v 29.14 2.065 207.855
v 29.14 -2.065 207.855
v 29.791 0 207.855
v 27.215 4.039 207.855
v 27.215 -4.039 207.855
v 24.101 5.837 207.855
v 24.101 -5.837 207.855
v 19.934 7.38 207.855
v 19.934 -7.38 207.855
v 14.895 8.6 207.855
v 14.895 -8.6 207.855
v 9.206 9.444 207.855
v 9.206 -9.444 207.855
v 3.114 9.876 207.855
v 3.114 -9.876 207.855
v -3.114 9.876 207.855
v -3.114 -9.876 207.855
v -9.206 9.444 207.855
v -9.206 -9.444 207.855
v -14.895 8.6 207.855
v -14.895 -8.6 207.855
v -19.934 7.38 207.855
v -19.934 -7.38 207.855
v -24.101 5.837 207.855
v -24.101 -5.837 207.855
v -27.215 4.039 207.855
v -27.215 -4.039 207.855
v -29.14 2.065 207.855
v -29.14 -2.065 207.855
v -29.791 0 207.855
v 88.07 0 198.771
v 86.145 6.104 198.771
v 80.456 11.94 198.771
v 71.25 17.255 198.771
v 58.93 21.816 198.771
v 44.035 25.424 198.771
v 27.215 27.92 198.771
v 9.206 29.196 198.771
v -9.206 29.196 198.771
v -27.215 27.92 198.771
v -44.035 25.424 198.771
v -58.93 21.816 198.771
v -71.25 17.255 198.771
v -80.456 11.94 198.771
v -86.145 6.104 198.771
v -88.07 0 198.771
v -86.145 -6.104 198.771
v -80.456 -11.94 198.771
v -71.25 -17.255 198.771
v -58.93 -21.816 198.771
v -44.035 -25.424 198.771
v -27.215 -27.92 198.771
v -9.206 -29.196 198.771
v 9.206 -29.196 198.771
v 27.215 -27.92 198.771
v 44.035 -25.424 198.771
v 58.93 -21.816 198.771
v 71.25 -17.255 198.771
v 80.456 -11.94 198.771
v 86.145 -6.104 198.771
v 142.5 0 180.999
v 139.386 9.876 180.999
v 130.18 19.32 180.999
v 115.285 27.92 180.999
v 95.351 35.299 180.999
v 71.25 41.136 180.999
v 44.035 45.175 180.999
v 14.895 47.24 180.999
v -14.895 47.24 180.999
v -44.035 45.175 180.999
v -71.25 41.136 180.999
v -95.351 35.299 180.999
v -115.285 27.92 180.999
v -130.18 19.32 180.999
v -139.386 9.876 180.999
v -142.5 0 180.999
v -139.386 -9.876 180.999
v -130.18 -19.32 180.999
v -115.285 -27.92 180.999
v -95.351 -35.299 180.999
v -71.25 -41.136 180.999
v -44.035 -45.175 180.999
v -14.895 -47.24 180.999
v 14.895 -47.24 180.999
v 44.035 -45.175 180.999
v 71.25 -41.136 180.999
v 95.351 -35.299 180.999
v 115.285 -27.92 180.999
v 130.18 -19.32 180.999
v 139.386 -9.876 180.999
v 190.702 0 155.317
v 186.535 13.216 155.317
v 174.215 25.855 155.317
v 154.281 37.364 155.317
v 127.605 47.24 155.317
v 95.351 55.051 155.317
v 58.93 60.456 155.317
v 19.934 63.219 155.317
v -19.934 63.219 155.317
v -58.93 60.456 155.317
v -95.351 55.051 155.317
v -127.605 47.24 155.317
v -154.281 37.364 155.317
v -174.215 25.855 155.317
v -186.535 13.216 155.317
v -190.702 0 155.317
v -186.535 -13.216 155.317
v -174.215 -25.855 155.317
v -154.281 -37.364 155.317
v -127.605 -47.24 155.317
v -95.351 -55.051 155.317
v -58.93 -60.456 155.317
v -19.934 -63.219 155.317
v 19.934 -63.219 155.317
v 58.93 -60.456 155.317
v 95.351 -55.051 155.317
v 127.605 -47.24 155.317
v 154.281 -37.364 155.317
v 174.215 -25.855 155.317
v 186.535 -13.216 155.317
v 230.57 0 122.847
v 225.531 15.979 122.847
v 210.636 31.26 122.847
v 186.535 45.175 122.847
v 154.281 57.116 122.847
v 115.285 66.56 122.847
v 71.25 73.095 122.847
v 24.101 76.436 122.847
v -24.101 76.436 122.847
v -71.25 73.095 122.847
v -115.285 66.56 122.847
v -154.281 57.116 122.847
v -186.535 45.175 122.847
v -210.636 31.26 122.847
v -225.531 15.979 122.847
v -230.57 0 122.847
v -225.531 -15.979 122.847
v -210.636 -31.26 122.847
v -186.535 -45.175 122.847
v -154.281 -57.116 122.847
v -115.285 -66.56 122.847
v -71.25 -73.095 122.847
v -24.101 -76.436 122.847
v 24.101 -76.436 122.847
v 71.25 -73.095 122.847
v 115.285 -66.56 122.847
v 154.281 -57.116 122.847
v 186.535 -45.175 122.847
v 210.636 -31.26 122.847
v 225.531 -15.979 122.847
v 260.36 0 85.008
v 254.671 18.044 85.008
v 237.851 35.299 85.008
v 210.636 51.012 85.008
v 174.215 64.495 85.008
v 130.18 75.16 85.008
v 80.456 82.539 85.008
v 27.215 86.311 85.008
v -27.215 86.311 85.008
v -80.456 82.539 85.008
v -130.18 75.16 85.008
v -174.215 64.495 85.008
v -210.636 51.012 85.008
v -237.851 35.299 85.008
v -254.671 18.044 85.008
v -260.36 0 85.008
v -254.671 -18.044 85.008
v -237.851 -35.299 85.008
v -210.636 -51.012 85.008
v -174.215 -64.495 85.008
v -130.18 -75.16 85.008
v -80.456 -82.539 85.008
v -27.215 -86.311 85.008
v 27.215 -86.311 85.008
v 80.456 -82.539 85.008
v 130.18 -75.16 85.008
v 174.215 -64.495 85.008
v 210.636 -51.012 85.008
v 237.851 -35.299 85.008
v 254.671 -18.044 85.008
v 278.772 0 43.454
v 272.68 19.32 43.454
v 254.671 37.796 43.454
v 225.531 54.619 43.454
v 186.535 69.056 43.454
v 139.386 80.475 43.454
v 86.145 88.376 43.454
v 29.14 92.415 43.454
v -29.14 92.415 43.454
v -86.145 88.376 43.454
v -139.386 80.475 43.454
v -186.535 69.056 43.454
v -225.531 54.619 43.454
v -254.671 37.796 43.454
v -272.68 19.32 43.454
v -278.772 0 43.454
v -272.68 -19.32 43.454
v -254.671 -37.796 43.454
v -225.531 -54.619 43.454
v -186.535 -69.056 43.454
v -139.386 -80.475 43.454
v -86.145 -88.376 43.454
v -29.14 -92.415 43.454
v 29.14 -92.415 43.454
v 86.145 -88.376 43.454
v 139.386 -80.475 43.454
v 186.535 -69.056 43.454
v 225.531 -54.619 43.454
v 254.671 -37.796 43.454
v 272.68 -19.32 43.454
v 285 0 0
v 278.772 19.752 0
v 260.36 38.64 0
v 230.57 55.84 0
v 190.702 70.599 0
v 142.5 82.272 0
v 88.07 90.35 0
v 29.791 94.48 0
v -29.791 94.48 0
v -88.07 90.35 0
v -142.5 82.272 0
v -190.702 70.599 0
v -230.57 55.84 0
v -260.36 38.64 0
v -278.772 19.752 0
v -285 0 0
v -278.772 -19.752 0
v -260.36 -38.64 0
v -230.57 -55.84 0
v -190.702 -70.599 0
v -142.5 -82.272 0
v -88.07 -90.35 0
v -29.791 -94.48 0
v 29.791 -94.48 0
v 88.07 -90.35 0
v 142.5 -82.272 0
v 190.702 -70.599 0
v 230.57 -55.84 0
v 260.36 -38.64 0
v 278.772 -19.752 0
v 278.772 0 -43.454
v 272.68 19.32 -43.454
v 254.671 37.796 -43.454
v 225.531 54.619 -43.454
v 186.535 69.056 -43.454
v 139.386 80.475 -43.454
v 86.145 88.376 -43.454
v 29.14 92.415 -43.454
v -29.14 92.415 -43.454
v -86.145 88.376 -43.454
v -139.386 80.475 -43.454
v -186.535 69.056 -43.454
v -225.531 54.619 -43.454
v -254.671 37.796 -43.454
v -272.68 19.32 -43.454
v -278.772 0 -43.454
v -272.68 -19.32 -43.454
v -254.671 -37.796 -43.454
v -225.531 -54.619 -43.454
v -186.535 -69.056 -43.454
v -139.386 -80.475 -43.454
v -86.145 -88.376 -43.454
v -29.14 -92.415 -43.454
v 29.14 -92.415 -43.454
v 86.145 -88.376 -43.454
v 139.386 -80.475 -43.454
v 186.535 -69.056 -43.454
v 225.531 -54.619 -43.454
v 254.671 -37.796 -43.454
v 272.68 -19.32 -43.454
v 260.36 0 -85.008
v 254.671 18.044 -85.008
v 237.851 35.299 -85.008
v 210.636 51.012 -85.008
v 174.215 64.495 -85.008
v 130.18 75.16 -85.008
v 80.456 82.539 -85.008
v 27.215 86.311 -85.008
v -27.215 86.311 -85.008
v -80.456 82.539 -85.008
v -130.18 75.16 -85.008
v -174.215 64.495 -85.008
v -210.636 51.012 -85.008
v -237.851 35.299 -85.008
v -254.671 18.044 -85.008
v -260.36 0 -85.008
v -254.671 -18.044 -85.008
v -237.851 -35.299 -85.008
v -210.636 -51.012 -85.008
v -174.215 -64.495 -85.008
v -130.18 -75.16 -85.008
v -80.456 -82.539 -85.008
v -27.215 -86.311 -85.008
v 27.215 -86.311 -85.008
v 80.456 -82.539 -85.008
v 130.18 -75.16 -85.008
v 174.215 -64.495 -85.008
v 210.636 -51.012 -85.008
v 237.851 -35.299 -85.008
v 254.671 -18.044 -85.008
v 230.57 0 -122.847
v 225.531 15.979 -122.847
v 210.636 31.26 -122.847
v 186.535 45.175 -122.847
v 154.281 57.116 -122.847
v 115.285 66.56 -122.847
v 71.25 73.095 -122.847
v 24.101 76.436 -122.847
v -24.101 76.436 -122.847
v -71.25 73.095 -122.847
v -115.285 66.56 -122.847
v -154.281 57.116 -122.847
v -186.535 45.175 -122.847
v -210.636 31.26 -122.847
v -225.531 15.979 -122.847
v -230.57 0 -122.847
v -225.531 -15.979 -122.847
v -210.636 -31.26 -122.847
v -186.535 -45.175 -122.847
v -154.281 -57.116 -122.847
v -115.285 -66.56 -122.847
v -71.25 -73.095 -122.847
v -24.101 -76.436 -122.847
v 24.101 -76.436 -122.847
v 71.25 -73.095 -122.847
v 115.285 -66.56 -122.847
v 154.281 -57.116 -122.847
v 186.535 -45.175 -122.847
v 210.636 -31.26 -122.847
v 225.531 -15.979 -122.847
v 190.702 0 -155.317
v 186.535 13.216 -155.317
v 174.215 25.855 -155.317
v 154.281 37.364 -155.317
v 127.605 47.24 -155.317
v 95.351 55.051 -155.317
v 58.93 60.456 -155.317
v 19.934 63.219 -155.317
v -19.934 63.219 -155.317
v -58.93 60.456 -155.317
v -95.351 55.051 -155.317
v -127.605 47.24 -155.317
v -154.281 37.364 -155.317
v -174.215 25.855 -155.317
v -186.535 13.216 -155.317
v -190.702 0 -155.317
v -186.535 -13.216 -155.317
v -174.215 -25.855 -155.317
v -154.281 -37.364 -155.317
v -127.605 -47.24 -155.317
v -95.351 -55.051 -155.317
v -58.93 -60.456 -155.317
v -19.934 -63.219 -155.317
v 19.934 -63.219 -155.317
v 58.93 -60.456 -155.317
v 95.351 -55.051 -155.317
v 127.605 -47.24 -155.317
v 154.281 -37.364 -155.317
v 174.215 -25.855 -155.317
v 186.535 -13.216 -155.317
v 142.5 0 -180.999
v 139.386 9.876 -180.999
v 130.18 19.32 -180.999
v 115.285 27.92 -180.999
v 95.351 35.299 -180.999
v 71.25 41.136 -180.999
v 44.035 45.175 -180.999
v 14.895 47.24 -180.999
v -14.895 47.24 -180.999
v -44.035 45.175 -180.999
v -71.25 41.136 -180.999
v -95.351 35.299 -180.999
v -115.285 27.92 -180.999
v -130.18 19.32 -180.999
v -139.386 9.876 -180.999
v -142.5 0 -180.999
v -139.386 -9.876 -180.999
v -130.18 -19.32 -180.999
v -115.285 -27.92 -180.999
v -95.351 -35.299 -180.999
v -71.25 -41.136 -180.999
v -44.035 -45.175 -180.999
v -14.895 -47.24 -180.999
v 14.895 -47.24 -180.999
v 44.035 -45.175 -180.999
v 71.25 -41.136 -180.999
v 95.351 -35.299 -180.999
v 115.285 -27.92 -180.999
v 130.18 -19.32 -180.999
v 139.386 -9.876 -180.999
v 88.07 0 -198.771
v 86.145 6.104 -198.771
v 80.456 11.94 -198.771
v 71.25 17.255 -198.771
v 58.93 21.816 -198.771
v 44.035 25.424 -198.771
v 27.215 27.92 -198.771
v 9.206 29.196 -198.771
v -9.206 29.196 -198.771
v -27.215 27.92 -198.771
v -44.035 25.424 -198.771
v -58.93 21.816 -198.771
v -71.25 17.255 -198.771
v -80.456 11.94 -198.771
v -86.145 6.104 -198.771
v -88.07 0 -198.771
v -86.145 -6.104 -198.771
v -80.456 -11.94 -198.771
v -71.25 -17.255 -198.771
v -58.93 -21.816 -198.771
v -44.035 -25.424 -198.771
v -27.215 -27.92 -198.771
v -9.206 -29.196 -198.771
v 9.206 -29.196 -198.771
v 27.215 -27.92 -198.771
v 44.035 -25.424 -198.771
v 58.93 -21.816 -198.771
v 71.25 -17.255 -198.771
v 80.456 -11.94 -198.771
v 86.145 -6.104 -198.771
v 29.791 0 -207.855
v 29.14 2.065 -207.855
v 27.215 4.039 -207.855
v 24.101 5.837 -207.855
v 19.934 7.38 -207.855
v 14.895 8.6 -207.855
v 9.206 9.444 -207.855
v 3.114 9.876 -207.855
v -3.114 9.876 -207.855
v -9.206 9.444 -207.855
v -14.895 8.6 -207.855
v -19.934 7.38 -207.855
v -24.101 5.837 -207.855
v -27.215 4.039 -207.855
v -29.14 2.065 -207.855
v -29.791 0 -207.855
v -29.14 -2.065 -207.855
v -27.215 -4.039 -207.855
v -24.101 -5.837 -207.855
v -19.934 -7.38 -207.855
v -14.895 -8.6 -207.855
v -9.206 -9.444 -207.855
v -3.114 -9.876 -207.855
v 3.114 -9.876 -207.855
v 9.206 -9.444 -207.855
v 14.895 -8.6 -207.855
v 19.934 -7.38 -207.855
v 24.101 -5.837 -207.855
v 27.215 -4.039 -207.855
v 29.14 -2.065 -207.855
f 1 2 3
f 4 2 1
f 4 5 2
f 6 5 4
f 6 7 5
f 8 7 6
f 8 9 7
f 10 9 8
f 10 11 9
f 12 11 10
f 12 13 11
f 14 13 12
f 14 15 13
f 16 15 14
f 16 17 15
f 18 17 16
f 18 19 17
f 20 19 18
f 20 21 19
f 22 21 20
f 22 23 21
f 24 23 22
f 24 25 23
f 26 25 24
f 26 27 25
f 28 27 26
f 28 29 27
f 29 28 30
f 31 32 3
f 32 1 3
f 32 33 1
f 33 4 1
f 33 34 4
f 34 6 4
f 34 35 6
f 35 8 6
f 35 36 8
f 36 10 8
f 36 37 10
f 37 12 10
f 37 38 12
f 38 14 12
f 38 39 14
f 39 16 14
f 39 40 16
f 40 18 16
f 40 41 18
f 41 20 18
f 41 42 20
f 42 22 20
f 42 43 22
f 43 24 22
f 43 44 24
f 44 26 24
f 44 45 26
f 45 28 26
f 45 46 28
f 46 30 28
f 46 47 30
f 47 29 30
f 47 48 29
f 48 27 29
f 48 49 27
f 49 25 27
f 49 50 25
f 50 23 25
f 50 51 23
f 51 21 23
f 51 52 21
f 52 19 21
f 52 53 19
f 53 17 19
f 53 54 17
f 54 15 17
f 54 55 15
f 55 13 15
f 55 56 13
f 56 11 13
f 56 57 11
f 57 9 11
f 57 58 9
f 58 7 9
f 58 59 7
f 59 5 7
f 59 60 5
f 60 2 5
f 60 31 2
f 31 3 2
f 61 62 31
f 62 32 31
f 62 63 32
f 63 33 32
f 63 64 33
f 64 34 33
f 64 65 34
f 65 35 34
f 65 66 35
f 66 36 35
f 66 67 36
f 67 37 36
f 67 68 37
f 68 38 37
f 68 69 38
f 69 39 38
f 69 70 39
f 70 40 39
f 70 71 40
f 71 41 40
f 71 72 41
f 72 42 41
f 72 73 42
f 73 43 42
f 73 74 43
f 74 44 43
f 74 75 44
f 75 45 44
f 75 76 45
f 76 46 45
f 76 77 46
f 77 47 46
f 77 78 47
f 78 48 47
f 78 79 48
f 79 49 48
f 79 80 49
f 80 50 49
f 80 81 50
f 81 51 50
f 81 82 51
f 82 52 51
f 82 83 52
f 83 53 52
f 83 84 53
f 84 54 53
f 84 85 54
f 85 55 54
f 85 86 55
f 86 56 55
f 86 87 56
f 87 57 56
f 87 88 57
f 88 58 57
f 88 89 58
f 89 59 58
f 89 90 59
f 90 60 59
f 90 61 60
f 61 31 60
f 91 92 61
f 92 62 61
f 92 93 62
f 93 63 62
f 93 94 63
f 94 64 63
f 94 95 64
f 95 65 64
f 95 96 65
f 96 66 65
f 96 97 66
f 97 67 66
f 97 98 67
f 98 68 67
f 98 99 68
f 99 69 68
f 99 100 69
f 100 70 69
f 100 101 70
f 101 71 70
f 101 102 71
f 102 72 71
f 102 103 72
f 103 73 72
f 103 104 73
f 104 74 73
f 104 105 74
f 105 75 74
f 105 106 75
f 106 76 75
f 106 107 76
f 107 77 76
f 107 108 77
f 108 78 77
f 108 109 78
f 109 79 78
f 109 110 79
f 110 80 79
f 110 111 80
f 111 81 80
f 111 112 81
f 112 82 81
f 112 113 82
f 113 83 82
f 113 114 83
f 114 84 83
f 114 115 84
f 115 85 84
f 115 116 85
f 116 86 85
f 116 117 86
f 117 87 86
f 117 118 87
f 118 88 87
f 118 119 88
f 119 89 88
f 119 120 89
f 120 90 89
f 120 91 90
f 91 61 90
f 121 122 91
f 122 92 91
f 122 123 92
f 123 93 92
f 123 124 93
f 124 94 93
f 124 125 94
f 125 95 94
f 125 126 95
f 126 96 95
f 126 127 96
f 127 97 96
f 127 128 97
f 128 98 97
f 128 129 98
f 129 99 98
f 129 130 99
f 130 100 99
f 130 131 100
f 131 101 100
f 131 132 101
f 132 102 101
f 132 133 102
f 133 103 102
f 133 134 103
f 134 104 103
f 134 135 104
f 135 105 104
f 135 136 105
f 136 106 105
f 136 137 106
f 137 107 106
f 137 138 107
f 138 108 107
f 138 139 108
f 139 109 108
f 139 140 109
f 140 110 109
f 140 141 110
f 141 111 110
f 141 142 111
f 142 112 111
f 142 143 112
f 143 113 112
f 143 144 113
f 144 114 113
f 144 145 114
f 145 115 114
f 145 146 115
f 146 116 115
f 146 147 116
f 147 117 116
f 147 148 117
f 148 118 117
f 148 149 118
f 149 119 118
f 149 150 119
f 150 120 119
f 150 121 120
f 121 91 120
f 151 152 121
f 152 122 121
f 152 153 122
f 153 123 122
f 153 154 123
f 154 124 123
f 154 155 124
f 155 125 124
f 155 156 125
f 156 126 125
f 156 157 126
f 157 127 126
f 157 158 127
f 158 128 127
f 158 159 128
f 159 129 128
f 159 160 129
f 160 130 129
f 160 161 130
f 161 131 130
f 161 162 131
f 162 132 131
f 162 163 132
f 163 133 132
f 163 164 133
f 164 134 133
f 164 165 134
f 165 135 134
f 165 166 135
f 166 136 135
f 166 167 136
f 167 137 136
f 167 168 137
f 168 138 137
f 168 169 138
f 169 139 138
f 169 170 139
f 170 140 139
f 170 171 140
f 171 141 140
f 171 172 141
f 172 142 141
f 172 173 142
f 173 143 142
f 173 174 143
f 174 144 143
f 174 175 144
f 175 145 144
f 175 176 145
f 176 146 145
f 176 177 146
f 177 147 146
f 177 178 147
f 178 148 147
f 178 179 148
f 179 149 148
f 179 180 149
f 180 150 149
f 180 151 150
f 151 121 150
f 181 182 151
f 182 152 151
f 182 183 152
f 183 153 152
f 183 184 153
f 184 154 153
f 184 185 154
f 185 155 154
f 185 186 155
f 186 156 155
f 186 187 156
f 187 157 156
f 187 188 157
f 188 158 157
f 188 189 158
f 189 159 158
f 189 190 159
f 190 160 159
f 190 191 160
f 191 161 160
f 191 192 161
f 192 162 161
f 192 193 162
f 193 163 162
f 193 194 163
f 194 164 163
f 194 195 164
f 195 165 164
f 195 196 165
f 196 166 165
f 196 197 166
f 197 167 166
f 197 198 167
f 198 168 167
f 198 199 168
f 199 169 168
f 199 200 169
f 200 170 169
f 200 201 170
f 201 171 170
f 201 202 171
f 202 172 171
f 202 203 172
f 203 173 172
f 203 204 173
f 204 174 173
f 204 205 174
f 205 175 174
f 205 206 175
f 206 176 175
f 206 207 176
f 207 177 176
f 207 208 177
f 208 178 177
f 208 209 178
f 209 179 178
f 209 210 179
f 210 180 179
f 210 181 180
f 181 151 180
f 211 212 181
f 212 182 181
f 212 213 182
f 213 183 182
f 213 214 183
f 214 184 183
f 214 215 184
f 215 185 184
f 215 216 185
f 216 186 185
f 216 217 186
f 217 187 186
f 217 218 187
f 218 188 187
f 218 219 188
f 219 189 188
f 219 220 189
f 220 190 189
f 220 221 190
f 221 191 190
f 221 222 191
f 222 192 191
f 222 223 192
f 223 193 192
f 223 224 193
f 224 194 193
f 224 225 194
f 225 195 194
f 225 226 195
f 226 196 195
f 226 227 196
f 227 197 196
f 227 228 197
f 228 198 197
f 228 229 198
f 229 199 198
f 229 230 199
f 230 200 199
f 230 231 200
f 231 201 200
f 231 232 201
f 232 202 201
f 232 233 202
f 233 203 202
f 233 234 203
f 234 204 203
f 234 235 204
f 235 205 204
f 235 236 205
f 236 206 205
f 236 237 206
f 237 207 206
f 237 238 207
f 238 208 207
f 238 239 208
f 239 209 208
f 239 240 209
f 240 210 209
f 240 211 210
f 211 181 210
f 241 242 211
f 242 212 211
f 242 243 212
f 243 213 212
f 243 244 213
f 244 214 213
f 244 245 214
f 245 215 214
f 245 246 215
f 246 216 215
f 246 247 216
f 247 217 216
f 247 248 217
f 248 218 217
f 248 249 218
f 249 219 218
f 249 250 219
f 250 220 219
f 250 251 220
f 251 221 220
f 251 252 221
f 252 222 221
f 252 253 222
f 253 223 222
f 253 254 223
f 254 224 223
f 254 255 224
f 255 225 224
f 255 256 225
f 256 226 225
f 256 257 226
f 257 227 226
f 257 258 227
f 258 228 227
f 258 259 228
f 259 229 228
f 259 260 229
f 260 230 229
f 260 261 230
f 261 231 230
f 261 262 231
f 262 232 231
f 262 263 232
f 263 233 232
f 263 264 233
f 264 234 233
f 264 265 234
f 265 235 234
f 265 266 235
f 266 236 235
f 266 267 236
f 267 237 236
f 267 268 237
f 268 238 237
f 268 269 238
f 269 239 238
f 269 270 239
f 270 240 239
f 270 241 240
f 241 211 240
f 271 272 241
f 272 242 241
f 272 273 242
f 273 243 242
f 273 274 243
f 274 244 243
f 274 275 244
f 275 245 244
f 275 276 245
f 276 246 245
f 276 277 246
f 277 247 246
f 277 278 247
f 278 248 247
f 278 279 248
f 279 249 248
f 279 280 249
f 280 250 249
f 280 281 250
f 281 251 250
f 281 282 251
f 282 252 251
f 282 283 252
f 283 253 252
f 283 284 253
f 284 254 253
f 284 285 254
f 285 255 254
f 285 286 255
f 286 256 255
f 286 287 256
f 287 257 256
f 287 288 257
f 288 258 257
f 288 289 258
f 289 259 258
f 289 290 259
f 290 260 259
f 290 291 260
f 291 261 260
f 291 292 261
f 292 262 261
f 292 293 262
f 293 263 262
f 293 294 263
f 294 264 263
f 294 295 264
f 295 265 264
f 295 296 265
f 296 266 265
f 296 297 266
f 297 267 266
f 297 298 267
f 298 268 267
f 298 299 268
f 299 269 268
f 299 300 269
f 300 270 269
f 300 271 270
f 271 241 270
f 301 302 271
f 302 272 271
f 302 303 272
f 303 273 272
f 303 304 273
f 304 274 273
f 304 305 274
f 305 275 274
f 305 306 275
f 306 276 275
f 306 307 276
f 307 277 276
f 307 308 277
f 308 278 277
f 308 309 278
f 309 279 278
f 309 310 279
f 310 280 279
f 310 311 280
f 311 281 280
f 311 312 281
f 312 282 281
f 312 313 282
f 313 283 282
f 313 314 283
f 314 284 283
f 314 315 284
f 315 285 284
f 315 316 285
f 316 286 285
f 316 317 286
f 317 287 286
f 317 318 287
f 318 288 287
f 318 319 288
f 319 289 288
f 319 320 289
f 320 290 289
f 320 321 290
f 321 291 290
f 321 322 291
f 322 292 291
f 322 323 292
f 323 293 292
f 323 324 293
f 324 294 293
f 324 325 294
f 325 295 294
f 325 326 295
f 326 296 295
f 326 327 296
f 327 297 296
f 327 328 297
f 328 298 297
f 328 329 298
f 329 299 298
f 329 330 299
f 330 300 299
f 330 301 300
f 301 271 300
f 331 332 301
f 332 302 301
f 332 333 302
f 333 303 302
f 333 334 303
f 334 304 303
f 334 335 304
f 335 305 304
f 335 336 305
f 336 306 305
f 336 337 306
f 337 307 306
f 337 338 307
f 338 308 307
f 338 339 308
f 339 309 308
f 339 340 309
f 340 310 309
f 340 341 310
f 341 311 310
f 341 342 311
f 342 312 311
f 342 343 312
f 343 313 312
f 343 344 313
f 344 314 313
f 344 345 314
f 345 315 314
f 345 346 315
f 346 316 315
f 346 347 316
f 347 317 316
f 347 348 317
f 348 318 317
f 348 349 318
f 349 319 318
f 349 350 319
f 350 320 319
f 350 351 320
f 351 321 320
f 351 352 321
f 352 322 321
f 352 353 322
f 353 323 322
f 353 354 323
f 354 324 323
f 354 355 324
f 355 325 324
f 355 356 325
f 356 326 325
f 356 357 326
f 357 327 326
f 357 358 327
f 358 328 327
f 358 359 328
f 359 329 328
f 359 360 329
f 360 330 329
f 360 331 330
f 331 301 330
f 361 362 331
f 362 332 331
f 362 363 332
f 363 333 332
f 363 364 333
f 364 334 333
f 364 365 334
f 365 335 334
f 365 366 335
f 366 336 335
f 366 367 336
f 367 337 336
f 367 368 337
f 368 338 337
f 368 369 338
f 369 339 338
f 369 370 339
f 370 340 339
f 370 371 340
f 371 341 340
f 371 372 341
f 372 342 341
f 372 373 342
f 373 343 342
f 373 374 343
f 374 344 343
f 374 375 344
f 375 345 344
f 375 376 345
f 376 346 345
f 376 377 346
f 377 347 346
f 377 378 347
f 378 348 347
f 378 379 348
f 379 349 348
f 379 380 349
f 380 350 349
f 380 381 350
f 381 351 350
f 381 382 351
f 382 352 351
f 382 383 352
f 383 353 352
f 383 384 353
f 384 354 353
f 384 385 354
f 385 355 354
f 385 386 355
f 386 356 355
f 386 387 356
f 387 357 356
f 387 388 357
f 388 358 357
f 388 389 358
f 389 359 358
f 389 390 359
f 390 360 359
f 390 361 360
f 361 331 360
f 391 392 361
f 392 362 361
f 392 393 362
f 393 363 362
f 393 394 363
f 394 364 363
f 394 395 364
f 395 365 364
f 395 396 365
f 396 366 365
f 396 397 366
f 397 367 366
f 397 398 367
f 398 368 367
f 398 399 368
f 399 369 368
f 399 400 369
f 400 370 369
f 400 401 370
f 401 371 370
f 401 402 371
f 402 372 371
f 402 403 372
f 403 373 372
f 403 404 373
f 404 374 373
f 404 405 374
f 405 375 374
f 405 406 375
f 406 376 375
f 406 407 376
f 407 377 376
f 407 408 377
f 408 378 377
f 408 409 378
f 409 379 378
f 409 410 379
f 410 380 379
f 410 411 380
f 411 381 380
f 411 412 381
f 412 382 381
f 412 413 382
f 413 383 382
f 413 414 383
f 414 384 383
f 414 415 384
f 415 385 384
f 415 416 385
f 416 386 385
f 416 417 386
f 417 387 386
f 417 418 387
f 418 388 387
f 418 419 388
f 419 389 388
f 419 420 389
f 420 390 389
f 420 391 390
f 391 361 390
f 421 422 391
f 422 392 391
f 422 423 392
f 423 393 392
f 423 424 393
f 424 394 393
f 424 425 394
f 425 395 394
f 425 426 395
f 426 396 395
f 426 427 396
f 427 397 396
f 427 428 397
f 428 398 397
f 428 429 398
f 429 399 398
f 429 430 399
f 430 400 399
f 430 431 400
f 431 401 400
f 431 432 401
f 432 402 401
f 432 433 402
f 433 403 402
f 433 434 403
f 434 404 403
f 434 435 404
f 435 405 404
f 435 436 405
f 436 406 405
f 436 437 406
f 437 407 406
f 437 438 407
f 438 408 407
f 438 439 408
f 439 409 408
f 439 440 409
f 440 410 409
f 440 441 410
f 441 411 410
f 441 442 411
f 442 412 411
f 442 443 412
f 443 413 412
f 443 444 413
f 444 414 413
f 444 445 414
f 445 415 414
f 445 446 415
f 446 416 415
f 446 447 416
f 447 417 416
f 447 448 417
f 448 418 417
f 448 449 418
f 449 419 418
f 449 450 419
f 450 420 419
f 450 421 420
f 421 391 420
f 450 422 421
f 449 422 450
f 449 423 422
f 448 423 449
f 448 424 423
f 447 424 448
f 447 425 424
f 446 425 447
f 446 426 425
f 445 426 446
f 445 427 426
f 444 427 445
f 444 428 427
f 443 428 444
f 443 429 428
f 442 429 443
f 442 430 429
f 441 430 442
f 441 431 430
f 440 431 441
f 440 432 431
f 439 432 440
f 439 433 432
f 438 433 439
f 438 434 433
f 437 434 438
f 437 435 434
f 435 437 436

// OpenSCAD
// Generated by SolidPython 1.0.1 on 2020-07-29 00:46:51


scale(v = [15, 5, 11]) {
	sphere(r = 19);
}
/***********************************************
*********      SolidPython code:      **********
************************************************
 
# import packages: SolidPython
from solid import *
from solid.utils import *
from itertools import chain, combinations, permutations


class Resize:

    def __init__(self, scad_file):
        self.scad_file = scad_file
        #self.scad_file = import_scad(scad_file)
        # cone/cylinder param:
        self.r1 = 0
        self.r2 = 0
        self.h = 0
        # rectangular prism param:
        self.w = 0
        self.l = 0
        # ellipse param:
        self.r = 0

    # import OpenScad code (file name corresponds to shape)


    # classify shape + parameters
    def assign(self, param1, param2, param3):
        if self.scad_file == 'cone.scad':
            self.r1 = param1
            self.r2 = param2
            self.h = param3
        elif self.scad_file == 'cylinder.scad':
            self.r1 = param1
            self.r2 = param2
            self.h = param3
        elif self.scad_file == 'rectangularPrism.scad':
            self.h = param1
            self.l = param2
            self.w = param3
        else:
            self.r = param1
            self.h = param2

    # resize parameters
    def iterate(self):
        x = range(3, 20, 2)
        i = 1
        if self.scad_file == 'cone.scad':
            tempList = list(permutations(x, 2))
            for temp in tempList:
                param1 = temp[0]
                param2 = temp[1]
                filepath = 'produced_scad_files/' + 'cone' + str(param1) + '_' + str(param2) + '_' + '.scad'
                scad_render_to_file(cylinder(h=param1, r1=param2, r2=0), filepath)

        elif self.scad_file == 'cylinder.scad':
            tempList = list(permutations(x, 3))
            for temp in tempList:
                param1 = temp[0]
                param2 = temp[1]
                filepath = 'produced_scad_files/' + 'cylinder' + str(param1) + '_' + str(param2) + '_' + '.scad'
                scad_render_to_file(cylinder(h=param1, r1=param2, r2=param2), filepath)

        elif self.scad_file == 'rectangularPrism.scad':
            tempList = list(permutations(x, 3))
            for temp in tempList:
                param1 = temp[0]
                param2 = temp[1]
                param3 = temp[2]
                filepath = 'produced_scad_files/' + 'rectangularPrism' + str(param1) + '_' + str(param2) + '_' + str(
                    param3) + '.scad'
                scad_render_to_file(cube(size=(param1, param2, param3)), filepath)

        elif self.scad_file == 'ellipse.scad':
            tempList = list(permutations(x, 4))
            for temp in tempList:
                param1 = temp[0]
                param2 = temp[1]
                param3 = temp[2]
                param4 = temp[3]
                filepath = 'produced_scad_files/' + 'ellipse' + str(param1) + '_' + str(param2) + '_' + str(param3) + '_' + str(param4) + '.scad'
                scad_render_to_file(scale([param1, param2, param3])(sphere(r=param4)), filepath)

    def render_to_scadfile(self):
        scad_render_to_file(scad, 'example.scad') 
 
************************************************/
